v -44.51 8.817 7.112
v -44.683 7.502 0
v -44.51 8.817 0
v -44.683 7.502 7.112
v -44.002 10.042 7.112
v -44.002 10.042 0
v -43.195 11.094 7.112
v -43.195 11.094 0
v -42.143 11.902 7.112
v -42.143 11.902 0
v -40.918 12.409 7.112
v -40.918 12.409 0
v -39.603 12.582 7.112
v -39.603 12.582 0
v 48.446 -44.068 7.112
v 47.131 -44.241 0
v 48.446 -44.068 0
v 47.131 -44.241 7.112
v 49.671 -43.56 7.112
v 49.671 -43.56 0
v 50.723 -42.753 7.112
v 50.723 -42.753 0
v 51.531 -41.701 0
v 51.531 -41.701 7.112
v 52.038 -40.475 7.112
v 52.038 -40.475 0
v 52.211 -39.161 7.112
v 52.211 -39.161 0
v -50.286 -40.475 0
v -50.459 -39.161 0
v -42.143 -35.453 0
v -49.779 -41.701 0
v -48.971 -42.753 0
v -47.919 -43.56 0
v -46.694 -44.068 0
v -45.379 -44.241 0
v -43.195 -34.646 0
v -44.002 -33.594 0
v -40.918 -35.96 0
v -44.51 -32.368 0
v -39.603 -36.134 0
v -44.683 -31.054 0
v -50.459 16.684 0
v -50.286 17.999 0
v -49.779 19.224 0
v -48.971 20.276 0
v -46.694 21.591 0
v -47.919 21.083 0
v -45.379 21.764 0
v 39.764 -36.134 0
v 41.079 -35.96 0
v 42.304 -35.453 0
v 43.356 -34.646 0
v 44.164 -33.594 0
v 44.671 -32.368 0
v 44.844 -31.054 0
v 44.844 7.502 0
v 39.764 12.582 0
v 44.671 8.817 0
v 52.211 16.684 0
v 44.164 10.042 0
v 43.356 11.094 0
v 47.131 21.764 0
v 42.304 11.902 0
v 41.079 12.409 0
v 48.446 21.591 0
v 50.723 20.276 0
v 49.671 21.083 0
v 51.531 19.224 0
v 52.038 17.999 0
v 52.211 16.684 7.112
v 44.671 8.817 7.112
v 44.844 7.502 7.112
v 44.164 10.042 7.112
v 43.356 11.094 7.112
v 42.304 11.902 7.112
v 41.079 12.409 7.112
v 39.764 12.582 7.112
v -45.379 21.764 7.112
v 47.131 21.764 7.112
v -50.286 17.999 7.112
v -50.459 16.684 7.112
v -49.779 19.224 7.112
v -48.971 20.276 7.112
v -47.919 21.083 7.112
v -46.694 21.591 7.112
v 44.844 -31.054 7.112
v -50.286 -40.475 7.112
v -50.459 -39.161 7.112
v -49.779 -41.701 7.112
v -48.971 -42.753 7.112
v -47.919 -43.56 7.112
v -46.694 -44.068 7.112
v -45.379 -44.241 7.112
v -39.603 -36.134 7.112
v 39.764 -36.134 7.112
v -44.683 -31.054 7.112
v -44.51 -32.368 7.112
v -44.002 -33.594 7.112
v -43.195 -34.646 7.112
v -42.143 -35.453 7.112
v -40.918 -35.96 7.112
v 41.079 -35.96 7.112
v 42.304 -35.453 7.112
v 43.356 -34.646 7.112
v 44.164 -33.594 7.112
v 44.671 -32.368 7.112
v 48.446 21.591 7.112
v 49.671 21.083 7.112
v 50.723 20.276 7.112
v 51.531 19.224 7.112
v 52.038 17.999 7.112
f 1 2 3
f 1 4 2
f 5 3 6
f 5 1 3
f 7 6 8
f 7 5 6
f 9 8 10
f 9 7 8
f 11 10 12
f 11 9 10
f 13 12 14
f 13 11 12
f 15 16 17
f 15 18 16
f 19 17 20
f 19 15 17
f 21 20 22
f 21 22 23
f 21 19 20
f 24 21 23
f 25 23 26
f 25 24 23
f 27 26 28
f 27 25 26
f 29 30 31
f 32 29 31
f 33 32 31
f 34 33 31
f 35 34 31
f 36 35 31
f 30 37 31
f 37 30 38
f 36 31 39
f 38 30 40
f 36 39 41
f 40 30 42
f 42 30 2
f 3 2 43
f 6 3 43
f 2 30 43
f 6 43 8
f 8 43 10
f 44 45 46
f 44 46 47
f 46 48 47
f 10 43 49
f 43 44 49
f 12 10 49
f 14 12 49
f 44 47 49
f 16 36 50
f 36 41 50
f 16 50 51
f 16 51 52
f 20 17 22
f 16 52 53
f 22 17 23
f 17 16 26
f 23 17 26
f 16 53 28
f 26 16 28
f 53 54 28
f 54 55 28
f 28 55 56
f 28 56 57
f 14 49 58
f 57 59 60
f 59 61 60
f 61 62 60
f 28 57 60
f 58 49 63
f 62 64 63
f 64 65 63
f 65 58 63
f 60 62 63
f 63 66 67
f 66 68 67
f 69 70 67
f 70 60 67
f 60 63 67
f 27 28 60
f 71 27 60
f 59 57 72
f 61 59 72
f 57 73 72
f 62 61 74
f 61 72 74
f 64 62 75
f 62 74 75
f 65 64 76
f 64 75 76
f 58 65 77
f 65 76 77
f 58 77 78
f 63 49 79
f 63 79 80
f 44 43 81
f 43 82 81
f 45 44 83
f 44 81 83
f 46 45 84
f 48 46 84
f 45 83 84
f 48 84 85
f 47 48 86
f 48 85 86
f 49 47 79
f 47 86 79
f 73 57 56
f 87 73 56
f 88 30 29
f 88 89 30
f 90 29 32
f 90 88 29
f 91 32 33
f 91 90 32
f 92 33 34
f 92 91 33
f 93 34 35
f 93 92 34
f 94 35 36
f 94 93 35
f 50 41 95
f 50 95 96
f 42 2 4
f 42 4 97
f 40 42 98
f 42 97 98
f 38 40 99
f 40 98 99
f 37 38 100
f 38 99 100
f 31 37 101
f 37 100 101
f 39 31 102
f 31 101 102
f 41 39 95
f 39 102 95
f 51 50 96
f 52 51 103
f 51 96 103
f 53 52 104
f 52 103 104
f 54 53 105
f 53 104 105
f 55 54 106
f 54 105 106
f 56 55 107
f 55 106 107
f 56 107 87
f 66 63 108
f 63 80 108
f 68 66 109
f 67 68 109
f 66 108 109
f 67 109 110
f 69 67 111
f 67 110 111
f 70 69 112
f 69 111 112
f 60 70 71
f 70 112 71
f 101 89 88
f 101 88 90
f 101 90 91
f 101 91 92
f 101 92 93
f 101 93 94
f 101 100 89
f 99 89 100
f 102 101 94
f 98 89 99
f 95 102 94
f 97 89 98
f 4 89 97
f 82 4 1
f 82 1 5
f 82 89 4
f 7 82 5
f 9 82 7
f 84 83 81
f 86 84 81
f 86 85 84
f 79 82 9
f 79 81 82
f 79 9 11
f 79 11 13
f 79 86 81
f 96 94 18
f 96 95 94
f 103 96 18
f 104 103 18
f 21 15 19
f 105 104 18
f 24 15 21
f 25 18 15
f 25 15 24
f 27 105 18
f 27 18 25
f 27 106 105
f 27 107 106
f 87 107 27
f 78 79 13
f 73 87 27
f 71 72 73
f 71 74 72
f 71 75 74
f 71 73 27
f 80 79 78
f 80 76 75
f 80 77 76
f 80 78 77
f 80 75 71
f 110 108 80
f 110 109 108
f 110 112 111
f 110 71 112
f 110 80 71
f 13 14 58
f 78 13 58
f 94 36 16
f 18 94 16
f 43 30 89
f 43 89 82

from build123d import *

# Parameters (mm, degrees)
F0_W       = 102.6703156531
F0_H       = 66.0045333207
F1_DEPTH   = 7.112
F2_W       = 89.5273201168
F2_H       = 48.7157646567
F1_FACE1_W = 102.6703156531
F1_FACE1_H = 66.0045333207
F3_DEPTH   = 7.113
F4_R       = 5.08


with BuildPart() as f1:
    # F0 (on Top) → F1 (new body)
    with BuildSketch(Plane.XY):
        with Locations((0.875947997, -11.2383794039)):
            Rectangle(F0_W, F0_H)
    extrude(amount=F1_DEPTH)

    # F2 (on face) + F1_face1 (on face) → F3 (cut, through all)
    with BuildSketch(Plane(origin=(0, 0, 0), x_dir=(1, 0, 0), z_dir=(0, 0, -1))):
        with Locations((0.0806543976, 11.7756640539)):
            Rectangle(F2_W, F2_H)
    with BuildSketch(Plane(origin=(0.875947997, -11.2383794039, 7.112), x_dir=(1, 0, 0), z_dir=(0, 0, 1))):
        Rectangle(F1_FACE1_W, F1_FACE1_H)
    extrude(amount=-F3_DEPTH, dir=(0, 0, -1), mode=Mode.SUBTRACT)

    # F4
    f4_edges = [f1.edges().sort_by_distance(p)[0] for p in [
        (-50.45921, 21.763887, 3.556),
        (52.211106, 21.763887, 3.556),
        (52.211106, -44.240646, 3.556),
        (-50.45921, -44.240646, 3.556),
        (-44.683006, -36.133546, 3.556),
        (-44.683006, 12.582218, 3.556),
        (44.844314, 12.582218, 3.556),
        (44.844314, -36.133546, 3.556),
    ]]
    fillet(f4_edges, radius=F4_R)


solid = f1.part
